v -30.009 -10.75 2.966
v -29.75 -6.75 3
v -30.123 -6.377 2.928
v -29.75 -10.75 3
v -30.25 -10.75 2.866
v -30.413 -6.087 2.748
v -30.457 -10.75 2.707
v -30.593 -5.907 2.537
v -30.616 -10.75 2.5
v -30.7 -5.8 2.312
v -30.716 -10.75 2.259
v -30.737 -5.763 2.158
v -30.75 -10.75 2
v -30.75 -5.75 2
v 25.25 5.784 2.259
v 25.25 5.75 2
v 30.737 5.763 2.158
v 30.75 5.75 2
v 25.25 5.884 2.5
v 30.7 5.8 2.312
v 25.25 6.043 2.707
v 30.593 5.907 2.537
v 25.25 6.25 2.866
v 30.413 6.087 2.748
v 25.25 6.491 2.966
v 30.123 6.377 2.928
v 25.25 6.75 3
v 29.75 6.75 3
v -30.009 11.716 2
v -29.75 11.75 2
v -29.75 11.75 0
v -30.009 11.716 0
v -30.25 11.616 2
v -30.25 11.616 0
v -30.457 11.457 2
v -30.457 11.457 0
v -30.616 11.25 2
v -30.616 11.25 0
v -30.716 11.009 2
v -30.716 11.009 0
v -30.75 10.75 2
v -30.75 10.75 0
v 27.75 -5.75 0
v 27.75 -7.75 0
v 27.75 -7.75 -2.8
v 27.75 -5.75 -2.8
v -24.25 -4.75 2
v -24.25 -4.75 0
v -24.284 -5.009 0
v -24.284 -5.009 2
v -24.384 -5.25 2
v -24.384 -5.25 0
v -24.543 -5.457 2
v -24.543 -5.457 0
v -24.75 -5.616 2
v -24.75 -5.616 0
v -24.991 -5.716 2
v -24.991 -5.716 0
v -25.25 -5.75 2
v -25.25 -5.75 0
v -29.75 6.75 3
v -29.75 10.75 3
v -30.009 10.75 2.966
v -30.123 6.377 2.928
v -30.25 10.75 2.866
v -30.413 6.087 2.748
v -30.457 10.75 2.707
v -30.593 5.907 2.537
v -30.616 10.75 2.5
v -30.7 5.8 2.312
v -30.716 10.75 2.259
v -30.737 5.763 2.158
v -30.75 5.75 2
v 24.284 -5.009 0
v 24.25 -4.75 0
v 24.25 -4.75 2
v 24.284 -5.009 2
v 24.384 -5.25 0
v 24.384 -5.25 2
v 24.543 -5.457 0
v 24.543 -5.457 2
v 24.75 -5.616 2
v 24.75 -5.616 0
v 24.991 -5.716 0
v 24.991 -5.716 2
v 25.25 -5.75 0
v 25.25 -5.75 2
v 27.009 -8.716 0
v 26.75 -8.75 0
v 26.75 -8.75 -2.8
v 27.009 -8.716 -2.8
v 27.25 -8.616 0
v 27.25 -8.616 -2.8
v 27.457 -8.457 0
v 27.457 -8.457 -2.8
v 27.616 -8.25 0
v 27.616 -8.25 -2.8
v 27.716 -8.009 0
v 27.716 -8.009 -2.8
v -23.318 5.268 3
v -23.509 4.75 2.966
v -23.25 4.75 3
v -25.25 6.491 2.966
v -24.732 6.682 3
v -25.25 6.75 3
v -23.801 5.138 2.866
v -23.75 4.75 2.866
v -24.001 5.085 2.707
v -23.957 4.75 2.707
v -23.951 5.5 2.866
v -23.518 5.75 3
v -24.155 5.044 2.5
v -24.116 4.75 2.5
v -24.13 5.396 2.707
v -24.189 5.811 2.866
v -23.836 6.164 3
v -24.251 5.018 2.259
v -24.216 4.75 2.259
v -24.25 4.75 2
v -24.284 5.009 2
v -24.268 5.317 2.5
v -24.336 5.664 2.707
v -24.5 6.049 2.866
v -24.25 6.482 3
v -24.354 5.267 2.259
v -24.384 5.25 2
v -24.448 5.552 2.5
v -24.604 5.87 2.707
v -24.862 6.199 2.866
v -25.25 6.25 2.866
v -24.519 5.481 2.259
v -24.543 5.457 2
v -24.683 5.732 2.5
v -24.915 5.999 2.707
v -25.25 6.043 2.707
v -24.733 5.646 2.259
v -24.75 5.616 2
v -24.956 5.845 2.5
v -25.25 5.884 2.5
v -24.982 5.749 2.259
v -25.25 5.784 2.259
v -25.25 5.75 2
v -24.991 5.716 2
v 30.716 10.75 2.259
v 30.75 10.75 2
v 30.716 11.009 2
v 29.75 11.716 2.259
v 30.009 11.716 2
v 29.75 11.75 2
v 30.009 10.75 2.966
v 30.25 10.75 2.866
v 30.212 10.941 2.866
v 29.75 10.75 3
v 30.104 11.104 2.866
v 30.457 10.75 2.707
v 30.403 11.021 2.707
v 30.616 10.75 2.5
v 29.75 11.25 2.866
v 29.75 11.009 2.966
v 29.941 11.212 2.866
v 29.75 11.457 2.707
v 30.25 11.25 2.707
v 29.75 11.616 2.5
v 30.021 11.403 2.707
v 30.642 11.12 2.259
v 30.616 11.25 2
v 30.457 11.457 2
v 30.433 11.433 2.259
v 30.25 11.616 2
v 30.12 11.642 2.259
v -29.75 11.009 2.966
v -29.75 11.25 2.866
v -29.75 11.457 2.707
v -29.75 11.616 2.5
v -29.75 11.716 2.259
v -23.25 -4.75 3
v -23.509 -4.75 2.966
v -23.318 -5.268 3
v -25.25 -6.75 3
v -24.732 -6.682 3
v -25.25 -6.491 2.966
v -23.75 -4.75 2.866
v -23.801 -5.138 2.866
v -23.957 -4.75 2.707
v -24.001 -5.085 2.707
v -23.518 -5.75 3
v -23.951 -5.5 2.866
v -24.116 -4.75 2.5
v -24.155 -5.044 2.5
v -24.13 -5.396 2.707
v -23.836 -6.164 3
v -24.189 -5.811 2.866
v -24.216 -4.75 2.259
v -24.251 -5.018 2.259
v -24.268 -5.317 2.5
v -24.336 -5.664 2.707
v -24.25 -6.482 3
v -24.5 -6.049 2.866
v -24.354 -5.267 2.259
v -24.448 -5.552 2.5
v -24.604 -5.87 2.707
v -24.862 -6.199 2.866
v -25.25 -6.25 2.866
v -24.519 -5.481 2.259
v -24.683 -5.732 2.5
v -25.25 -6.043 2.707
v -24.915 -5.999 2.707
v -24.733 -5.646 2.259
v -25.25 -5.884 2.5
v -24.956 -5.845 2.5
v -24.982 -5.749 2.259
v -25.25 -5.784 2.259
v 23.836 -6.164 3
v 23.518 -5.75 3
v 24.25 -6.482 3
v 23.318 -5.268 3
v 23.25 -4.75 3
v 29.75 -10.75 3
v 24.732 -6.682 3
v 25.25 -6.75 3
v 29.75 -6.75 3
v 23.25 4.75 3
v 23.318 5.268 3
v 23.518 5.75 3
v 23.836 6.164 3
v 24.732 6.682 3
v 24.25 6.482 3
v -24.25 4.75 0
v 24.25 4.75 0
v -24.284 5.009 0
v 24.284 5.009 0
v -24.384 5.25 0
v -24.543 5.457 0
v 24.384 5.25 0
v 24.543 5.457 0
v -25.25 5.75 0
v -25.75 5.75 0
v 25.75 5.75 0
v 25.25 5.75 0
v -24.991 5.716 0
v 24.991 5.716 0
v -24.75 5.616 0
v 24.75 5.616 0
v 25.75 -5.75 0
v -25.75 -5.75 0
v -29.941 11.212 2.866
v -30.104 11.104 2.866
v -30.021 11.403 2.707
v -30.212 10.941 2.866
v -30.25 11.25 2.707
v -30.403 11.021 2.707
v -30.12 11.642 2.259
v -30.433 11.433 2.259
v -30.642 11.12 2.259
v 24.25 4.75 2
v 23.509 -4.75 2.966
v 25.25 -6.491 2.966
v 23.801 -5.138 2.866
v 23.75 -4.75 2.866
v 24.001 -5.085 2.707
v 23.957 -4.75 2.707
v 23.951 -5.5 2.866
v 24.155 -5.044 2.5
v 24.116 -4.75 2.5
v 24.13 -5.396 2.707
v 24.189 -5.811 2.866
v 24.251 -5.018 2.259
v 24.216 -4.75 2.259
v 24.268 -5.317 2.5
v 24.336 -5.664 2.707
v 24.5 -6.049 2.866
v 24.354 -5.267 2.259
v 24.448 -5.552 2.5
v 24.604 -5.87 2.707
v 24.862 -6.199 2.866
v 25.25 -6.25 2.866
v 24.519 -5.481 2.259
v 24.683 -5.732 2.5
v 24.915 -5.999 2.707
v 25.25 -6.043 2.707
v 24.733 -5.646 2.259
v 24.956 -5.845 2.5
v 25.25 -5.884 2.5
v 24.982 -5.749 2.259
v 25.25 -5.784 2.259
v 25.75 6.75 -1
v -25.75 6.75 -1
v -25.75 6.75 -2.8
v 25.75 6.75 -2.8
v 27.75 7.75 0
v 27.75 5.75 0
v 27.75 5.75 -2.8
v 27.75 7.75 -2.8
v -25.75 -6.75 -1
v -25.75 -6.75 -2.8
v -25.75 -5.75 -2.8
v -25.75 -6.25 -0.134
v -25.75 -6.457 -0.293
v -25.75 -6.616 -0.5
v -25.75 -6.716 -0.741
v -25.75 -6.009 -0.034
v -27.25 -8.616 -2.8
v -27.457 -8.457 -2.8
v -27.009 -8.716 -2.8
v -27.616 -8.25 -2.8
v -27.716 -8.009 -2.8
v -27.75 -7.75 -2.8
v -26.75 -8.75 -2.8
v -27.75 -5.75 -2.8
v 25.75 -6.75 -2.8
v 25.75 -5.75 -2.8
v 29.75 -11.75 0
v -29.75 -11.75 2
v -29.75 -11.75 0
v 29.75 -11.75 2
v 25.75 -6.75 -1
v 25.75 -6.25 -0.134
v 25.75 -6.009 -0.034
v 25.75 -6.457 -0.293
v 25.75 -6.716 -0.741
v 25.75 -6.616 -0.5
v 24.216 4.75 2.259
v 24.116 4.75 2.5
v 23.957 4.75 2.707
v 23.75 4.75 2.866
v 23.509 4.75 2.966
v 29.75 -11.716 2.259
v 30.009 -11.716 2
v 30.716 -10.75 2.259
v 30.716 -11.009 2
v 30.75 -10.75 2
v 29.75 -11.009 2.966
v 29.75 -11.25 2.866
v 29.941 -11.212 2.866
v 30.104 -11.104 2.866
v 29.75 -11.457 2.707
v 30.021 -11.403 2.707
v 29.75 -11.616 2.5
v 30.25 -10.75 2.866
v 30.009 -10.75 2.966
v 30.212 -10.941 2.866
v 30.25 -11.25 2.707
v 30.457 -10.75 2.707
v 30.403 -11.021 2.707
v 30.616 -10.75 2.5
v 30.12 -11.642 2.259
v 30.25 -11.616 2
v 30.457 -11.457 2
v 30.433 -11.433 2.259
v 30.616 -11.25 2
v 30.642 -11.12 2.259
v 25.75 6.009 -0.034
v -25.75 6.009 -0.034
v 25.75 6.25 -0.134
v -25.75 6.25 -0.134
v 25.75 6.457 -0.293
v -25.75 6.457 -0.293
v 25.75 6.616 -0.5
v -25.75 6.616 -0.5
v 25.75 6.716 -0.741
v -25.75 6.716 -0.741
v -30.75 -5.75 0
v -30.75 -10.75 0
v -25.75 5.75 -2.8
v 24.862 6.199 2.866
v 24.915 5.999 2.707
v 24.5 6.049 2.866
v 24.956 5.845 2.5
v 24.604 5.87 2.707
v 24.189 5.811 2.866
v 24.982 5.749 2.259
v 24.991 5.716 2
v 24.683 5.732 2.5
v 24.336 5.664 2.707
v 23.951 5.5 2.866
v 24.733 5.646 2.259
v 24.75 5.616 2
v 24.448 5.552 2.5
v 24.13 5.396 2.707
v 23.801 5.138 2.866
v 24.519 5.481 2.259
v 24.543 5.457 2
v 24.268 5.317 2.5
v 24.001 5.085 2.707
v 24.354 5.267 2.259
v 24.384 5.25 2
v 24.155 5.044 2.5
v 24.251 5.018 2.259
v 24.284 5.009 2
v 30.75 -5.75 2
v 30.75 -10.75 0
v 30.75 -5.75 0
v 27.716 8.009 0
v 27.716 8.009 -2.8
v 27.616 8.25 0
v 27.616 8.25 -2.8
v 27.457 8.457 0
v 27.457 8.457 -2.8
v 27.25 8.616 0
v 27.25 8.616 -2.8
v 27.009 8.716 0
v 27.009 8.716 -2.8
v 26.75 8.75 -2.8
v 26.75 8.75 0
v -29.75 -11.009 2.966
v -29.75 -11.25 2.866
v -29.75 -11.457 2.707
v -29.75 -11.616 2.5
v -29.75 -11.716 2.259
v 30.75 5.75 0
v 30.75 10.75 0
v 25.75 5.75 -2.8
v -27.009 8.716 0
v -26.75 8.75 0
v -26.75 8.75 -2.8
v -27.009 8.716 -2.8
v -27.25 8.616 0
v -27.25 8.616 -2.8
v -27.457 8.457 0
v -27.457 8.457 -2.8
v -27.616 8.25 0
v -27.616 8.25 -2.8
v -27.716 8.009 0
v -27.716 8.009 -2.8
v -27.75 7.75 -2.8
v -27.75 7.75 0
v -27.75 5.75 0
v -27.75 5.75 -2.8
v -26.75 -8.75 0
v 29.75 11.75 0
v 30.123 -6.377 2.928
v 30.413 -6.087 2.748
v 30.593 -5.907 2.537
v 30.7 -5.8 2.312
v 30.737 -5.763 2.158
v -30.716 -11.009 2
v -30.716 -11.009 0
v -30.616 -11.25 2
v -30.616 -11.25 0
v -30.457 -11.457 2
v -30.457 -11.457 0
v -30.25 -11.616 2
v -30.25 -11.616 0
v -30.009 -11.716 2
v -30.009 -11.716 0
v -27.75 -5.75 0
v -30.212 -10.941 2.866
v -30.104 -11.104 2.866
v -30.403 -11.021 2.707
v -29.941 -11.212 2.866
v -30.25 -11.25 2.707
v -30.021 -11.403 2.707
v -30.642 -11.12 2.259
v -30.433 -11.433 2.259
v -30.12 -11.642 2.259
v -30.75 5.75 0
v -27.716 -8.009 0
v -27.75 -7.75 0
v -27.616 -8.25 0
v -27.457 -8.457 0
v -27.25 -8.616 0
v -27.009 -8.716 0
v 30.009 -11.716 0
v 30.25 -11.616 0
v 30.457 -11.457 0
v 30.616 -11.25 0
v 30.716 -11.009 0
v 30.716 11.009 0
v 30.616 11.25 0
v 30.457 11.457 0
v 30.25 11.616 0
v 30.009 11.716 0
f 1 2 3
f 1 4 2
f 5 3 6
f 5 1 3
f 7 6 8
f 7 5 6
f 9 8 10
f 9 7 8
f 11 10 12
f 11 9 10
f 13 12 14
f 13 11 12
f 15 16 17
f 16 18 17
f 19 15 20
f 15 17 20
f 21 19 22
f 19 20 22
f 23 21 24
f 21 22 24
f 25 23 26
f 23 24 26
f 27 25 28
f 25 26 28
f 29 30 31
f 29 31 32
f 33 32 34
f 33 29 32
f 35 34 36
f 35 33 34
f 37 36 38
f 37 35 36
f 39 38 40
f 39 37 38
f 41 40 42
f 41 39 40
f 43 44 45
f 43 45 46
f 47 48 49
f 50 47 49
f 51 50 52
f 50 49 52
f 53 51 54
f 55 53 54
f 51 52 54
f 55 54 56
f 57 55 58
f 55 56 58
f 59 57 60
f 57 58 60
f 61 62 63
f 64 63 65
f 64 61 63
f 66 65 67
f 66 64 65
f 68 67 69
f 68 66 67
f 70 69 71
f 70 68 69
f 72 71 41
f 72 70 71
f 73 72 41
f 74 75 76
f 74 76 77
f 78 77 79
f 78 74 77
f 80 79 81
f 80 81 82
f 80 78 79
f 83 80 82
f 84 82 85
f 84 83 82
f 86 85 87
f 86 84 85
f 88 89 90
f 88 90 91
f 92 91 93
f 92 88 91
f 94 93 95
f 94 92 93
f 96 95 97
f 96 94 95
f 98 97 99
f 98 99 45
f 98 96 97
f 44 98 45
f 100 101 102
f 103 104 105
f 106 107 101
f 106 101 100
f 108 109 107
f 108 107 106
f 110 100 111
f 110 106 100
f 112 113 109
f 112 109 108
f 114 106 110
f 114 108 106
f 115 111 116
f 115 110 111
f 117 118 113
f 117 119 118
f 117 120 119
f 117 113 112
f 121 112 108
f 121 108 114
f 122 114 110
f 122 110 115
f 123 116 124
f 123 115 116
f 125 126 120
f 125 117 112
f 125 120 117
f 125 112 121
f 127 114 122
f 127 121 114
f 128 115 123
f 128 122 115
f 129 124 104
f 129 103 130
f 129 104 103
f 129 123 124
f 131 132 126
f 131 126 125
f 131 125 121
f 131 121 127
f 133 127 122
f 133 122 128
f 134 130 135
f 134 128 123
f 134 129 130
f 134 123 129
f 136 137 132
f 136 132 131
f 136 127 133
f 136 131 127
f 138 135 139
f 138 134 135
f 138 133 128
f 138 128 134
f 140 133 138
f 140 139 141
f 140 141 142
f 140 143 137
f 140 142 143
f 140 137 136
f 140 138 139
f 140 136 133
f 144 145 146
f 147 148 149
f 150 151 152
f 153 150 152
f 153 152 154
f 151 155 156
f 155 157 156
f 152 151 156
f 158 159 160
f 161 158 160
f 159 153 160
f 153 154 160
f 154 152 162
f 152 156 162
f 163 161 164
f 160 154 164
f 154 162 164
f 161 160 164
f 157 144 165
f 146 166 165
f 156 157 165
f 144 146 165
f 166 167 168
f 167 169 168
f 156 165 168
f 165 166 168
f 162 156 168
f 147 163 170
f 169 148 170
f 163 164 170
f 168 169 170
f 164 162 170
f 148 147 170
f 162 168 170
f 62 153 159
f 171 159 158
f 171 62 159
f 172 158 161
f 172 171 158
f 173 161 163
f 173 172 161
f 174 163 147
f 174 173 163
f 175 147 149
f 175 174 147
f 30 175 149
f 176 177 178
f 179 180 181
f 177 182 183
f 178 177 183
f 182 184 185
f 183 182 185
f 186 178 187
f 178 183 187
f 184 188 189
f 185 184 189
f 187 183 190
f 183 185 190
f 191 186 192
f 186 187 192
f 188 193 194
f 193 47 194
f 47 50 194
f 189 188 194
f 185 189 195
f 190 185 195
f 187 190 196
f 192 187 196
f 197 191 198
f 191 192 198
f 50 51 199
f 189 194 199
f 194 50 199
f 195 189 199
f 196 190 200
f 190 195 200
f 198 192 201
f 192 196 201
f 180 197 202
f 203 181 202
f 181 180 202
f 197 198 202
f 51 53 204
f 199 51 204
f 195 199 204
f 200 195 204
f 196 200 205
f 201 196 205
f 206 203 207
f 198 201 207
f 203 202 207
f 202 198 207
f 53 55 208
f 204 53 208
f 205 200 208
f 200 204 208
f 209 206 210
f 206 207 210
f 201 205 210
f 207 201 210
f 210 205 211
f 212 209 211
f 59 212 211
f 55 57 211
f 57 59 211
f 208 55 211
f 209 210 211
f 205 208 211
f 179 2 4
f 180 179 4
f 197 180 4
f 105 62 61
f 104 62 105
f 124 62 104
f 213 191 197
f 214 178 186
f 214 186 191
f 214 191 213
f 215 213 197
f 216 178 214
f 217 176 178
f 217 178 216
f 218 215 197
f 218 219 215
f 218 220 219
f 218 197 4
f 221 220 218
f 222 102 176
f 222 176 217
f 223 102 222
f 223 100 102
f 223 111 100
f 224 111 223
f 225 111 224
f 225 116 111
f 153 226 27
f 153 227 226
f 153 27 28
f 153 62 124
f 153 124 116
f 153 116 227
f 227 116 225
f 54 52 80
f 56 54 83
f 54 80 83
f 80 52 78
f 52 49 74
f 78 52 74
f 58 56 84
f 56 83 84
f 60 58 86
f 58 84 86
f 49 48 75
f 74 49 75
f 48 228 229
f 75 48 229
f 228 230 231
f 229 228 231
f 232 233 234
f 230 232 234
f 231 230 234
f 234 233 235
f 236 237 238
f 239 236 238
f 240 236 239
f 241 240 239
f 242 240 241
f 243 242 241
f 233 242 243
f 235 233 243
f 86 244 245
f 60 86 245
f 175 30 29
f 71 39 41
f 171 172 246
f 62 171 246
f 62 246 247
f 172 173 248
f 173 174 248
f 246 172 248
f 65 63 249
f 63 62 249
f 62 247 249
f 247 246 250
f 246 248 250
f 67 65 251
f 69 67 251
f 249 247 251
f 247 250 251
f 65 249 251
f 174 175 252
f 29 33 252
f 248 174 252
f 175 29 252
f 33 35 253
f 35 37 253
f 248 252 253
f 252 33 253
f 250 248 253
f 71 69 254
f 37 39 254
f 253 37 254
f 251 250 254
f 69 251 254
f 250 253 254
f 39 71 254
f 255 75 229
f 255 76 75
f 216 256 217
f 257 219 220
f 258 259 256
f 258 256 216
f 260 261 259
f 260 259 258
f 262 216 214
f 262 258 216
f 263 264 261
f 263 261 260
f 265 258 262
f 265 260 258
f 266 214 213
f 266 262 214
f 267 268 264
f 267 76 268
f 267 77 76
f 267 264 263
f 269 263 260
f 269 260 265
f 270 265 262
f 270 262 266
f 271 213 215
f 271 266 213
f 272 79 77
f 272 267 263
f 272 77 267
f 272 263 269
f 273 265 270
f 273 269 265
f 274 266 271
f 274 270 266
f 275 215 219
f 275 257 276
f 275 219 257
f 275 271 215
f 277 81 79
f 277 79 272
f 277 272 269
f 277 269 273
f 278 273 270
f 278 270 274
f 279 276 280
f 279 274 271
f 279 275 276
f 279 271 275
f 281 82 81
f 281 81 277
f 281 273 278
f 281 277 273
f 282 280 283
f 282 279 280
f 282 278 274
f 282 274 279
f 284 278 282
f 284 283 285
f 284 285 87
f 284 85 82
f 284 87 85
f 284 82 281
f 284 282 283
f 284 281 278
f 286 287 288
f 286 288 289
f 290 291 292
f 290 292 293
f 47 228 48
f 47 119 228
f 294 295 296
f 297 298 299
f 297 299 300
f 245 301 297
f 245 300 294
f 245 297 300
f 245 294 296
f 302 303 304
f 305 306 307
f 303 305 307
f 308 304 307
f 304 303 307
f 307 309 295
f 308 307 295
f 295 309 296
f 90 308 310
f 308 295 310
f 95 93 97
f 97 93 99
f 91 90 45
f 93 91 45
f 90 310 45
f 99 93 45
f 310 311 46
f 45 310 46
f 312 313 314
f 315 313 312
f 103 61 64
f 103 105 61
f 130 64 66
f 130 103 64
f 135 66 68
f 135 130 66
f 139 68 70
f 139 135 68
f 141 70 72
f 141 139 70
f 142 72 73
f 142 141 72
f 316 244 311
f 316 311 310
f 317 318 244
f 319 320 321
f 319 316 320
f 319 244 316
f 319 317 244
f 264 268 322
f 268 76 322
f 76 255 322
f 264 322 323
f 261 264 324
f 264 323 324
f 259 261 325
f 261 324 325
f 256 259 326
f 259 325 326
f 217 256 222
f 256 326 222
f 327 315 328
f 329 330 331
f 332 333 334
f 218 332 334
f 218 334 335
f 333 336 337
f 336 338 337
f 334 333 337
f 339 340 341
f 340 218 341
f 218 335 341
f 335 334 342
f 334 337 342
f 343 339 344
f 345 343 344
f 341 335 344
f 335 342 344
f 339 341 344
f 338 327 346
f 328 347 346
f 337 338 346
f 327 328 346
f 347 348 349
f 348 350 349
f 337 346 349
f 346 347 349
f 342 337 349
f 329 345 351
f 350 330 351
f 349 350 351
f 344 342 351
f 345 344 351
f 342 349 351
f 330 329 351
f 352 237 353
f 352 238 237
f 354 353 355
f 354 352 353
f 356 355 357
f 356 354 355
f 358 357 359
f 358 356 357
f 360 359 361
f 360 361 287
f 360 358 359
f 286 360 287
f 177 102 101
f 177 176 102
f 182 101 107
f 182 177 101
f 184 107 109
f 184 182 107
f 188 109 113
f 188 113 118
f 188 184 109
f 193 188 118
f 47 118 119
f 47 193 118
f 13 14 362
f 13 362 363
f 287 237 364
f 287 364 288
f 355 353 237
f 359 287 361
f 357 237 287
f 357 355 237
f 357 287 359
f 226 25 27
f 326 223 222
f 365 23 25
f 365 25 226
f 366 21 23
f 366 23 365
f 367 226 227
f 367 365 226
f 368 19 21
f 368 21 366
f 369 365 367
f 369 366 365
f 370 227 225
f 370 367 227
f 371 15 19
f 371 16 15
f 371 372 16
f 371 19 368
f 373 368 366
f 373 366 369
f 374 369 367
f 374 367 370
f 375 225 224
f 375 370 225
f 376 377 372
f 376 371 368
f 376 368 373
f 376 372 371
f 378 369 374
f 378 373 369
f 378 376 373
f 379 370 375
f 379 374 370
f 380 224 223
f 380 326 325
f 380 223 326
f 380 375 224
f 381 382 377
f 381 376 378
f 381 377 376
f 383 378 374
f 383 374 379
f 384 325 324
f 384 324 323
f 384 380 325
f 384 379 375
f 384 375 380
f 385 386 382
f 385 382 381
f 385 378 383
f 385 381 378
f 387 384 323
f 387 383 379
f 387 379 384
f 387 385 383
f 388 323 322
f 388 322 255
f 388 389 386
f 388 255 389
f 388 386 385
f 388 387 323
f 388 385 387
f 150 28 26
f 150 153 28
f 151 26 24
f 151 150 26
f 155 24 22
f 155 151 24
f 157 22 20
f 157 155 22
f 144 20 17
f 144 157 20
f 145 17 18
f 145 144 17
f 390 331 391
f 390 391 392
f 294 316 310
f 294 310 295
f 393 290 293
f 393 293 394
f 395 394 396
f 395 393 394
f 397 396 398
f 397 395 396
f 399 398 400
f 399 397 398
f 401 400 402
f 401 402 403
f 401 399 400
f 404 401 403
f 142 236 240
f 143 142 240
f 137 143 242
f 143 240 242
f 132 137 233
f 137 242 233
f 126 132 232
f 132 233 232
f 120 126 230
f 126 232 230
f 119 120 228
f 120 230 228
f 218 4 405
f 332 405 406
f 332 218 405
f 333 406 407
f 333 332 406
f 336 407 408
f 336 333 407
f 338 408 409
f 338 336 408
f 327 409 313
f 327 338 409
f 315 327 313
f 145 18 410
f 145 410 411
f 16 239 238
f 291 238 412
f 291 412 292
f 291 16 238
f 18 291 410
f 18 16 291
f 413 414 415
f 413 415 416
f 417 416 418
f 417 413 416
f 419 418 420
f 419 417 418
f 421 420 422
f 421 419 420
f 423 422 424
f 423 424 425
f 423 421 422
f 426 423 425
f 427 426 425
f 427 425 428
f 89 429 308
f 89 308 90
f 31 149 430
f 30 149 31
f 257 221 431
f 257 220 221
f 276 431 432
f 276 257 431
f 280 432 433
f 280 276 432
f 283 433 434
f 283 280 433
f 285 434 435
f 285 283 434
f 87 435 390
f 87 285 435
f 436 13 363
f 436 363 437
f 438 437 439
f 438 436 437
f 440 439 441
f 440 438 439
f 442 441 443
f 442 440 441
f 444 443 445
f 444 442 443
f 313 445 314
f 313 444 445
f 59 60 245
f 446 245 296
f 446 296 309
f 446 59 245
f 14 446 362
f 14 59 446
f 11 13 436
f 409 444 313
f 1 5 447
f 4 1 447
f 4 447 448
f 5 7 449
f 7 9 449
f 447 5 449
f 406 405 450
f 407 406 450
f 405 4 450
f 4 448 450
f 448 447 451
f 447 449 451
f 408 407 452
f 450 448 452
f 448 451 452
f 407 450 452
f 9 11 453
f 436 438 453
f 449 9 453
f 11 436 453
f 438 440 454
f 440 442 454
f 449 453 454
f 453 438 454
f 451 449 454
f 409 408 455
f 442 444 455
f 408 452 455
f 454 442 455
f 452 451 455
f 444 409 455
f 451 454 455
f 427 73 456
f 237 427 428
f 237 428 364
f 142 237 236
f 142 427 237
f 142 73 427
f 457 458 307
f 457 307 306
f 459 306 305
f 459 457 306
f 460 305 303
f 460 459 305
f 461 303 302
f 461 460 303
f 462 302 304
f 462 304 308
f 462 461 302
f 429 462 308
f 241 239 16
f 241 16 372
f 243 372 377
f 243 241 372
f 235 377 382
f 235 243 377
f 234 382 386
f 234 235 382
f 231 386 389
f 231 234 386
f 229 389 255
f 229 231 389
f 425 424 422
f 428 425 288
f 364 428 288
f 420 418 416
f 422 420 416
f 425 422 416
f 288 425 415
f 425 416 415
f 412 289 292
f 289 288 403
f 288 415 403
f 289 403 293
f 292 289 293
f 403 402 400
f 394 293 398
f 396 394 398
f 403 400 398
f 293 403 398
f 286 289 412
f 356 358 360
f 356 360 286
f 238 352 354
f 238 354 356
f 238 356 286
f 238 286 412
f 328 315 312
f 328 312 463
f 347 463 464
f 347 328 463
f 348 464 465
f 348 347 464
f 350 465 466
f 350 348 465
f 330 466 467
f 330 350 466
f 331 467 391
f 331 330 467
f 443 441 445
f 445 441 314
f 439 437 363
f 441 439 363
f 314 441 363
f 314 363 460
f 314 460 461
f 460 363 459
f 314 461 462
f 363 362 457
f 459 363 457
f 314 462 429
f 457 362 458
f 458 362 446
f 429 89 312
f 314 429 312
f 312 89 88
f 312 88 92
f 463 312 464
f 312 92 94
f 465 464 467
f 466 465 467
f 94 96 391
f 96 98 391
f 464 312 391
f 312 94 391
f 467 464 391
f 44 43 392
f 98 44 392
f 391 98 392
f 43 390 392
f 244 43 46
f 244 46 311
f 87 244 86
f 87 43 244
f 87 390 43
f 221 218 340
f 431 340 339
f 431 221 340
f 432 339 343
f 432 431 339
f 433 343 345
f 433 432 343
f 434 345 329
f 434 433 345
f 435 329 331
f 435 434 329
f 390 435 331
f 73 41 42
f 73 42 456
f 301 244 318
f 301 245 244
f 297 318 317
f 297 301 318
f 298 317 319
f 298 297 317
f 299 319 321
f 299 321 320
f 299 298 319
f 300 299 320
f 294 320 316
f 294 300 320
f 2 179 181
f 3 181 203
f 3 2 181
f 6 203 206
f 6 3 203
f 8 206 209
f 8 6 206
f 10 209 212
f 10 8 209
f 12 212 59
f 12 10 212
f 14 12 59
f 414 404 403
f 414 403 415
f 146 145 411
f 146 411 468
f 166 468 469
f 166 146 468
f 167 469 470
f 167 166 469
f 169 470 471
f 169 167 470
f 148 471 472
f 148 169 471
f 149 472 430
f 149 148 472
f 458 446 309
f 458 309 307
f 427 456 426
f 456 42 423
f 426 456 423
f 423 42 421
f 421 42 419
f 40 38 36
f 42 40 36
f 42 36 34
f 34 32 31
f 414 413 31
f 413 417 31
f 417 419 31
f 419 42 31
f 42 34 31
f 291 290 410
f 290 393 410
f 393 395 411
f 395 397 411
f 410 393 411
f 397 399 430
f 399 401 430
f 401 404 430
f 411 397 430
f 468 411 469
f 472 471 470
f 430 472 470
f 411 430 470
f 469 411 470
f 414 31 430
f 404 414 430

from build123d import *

# Parameters (mm, degrees)
BOSS_EXTRUDE2_DEPTH   = 2.8
BOSS_EXTRUDE2_2_DEPTH = 2.8
BOSS_EXTRUDE1_START   = 3
BOSS_EXTRUDE1_DEPTH   = 3
FILLET1_R             = 1


with BuildPart() as part:
    # Sketch3 → Boss-Extrude2 (new body)
    with BuildSketch(Plane.XY):
        with BuildLine():
            Line((25.75, 5.75), (27.75, 5.75))
            Line((27.75, 5.75), (27.75, 7.75))
            ThreePointArc((27.75, 7.75), (27.457106781, 8.457106781), (26.75, 8.75))
            Line((26.75, 8.75), (-26.75, 8.75))
            ThreePointArc((-26.75, 8.75), (-27.457106781, 8.457106781), (-27.75, 7.75))
            Line((-27.75, 7.75), (-27.75, 5.75))
            Line((-27.75, 5.75), (-25.75, 5.75))
            Line((-25.75, 5.75), (-25.75, 6.75))
            Line((-25.75, 6.75), (25.75, 6.75))
            Line((25.75, 6.75), (25.75, 5.75))
        make_face()
    extrude(amount=-BOSS_EXTRUDE2_DEPTH)



with BuildPart() as body_2:
    # Sketch3 → Boss-Extrude2 2 (new body)
    with BuildSketch(Plane.XY):
        with BuildLine():
            Line((-25.75, -6.75), (-25.75, -5.75))
            Line((-25.75, -5.75), (-27.75, -5.75))
            Line((-27.75, -5.75), (-27.75, -7.75))
            ThreePointArc((-27.75, -7.75), (-27.457106781, -8.457106781), (-26.75, -8.75))
            Line((-26.75, -8.75), (26.75, -8.75))
            ThreePointArc((26.75, -8.75), (27.457106781, -8.457106781), (27.75, -7.75))
            Line((27.75, -7.75), (27.75, -5.75))
            Line((27.75, -5.75), (25.75, -5.75))
            Line((25.75, -5.75), (25.75, -6.75))
            Line((25.75, -6.75), (-25.75, -6.75))
        make_face()
    extrude(amount=-BOSS_EXTRUDE2_2_DEPTH)


with BuildPart() as part_1:
    add(part.part)

    add(body_2.part)  # Boss-Extrude1 merges body 2
    # Sketch2 → Boss-Extrude1 (add)
    with BuildSketch(Plane.XY.offset(BOSS_EXTRUDE1_START)):
        with BuildLine():
            Line((24.25, 5.75), (27.75, 5.75))
            Line((27.75, 5.75), (27.75, 7.75))
            ThreePointArc((27.75, 7.75), (27.457106781, 8.457106781), (26.75, 8.75))
            Line((26.75, 8.75), (-26.75, 8.75))
            ThreePointArc((-26.75, 8.75), (-27.457106781, 8.457106781), (-27.75, 7.75))
            Line((-27.75, 7.75), (-27.75, 5.75))
            Line((-27.75, 5.75), (-24.25, 5.75))
            Line((-24.25, 5.75), (-24.25, -5.75))
            Line((-24.25, -5.75), (-27.75, -5.75))
            Line((-27.75, -5.75), (-27.75, -7.75))
            ThreePointArc((-27.75, -7.75), (-27.457106781, -8.457106781), (-26.75, -8.75))
            Line((-26.75, -8.75), (26.75, -8.75))
            ThreePointArc((26.75, -8.75), (27.457106781, -8.457106781), (27.75, -7.75))
            Line((27.75, -7.75), (27.75, -5.75))
            Line((27.75, -5.75), (24.25, -5.75))
            Line((24.25, -5.75), (24.25, 5.75))
        make_face()
        with BuildLine():
            ThreePointArc((30.75, 10.75), (30.457106781, 11.457106781), (29.75, 11.75))
            Line((29.75, 11.75), (-29.75, 11.75))
            ThreePointArc((-29.75, 11.75), (-30.457106781, 11.457106781), (-30.75, 10.75))
            Line((-30.75, 10.75), (-30.75, 5.75))
            Line((-30.75, 5.75), (-27.75, 5.75))
            Line((-27.75, 5.75), (-27.75, 7.75))
            ThreePointArc((-27.75, 7.75), (-27.457106781, 8.457106781), (-26.75, 8.75))
            Line((-26.75, 8.75), (26.75, 8.75))
            ThreePointArc((26.75, 8.75), (27.457106781, 8.457106781), (27.75, 7.75))
            Line((27.75, 7.75), (27.75, 5.75))
            Line((27.75, 5.75), (30.75, 5.75))
            Line((30.75, 5.75), (30.75, 10.75))
        make_face()
        with BuildLine():
            Line((-30.75, -5.75), (-30.75, -10.75))
            ThreePointArc((-30.75, -10.75), (-30.457106781, -11.457106781), (-29.75, -11.75))
            Line((-29.75, -11.75), (29.75, -11.75))
            ThreePointArc((29.75, -11.75), (30.457106781, -11.457106781), (30.75, -10.75))
            Line((30.75, -10.75), (30.75, -5.75))
            Line((30.75, -5.75), (27.75, -5.75))
            Line((27.75, -5.75), (27.75, -7.75))
            ThreePointArc((27.75, -7.75), (27.457106781, -8.457106781), (26.75, -8.75))
            Line((26.75, -8.75), (-26.75, -8.75))
            ThreePointArc((-26.75, -8.75), (-27.457106781, -8.457106781), (-27.75, -7.75))
            Line((-27.75, -7.75), (-27.75, -5.75))
            Line((-27.75, -5.75), (-30.75, -5.75))
        make_face()
    extrude(amount=-BOSS_EXTRUDE1_DEPTH)

    # Fillet1
    fillet1_edges = [part_1.edges().sort_by_distance(p)[0] for p in [
        (24.25, -5.75, 1.5),
        (24.25, 5.75, 1.5),
        (-24.25, -5.75, 1.5),
        (-24.25, 5.75, 1.5),
        (-24.25, 0, 3),
        (-27.5, 5.75, 3),
        (-30.75, 8.25, 3),
        (-30.457106781, 11.457106781, 3),
        (0, 11.75, 3),
        (30.457106781, 11.457106781, 3),
        (30.75, 8.25, 3),
        (27.5, 5.75, 3),
        (24.25, 0, 3),
        (27.5, -5.75, 3),
        (30.75, -8.25, 3),
        (30.457106781, -11.457106781, 3),
        (0, -11.75, 3),
        (-30.457106781, -11.457106781, 3),
        (-30.75, -8.25, 3),
        (-27.5, -5.75, 3),
        (0, 6.75, 0),
        (0, -6.75, 0),
    ]]
    fillet(fillet1_edges, radius=FILLET1_R - 0.0001)  # a hair under: the kernel refuses the full size


solid = part_1.part
